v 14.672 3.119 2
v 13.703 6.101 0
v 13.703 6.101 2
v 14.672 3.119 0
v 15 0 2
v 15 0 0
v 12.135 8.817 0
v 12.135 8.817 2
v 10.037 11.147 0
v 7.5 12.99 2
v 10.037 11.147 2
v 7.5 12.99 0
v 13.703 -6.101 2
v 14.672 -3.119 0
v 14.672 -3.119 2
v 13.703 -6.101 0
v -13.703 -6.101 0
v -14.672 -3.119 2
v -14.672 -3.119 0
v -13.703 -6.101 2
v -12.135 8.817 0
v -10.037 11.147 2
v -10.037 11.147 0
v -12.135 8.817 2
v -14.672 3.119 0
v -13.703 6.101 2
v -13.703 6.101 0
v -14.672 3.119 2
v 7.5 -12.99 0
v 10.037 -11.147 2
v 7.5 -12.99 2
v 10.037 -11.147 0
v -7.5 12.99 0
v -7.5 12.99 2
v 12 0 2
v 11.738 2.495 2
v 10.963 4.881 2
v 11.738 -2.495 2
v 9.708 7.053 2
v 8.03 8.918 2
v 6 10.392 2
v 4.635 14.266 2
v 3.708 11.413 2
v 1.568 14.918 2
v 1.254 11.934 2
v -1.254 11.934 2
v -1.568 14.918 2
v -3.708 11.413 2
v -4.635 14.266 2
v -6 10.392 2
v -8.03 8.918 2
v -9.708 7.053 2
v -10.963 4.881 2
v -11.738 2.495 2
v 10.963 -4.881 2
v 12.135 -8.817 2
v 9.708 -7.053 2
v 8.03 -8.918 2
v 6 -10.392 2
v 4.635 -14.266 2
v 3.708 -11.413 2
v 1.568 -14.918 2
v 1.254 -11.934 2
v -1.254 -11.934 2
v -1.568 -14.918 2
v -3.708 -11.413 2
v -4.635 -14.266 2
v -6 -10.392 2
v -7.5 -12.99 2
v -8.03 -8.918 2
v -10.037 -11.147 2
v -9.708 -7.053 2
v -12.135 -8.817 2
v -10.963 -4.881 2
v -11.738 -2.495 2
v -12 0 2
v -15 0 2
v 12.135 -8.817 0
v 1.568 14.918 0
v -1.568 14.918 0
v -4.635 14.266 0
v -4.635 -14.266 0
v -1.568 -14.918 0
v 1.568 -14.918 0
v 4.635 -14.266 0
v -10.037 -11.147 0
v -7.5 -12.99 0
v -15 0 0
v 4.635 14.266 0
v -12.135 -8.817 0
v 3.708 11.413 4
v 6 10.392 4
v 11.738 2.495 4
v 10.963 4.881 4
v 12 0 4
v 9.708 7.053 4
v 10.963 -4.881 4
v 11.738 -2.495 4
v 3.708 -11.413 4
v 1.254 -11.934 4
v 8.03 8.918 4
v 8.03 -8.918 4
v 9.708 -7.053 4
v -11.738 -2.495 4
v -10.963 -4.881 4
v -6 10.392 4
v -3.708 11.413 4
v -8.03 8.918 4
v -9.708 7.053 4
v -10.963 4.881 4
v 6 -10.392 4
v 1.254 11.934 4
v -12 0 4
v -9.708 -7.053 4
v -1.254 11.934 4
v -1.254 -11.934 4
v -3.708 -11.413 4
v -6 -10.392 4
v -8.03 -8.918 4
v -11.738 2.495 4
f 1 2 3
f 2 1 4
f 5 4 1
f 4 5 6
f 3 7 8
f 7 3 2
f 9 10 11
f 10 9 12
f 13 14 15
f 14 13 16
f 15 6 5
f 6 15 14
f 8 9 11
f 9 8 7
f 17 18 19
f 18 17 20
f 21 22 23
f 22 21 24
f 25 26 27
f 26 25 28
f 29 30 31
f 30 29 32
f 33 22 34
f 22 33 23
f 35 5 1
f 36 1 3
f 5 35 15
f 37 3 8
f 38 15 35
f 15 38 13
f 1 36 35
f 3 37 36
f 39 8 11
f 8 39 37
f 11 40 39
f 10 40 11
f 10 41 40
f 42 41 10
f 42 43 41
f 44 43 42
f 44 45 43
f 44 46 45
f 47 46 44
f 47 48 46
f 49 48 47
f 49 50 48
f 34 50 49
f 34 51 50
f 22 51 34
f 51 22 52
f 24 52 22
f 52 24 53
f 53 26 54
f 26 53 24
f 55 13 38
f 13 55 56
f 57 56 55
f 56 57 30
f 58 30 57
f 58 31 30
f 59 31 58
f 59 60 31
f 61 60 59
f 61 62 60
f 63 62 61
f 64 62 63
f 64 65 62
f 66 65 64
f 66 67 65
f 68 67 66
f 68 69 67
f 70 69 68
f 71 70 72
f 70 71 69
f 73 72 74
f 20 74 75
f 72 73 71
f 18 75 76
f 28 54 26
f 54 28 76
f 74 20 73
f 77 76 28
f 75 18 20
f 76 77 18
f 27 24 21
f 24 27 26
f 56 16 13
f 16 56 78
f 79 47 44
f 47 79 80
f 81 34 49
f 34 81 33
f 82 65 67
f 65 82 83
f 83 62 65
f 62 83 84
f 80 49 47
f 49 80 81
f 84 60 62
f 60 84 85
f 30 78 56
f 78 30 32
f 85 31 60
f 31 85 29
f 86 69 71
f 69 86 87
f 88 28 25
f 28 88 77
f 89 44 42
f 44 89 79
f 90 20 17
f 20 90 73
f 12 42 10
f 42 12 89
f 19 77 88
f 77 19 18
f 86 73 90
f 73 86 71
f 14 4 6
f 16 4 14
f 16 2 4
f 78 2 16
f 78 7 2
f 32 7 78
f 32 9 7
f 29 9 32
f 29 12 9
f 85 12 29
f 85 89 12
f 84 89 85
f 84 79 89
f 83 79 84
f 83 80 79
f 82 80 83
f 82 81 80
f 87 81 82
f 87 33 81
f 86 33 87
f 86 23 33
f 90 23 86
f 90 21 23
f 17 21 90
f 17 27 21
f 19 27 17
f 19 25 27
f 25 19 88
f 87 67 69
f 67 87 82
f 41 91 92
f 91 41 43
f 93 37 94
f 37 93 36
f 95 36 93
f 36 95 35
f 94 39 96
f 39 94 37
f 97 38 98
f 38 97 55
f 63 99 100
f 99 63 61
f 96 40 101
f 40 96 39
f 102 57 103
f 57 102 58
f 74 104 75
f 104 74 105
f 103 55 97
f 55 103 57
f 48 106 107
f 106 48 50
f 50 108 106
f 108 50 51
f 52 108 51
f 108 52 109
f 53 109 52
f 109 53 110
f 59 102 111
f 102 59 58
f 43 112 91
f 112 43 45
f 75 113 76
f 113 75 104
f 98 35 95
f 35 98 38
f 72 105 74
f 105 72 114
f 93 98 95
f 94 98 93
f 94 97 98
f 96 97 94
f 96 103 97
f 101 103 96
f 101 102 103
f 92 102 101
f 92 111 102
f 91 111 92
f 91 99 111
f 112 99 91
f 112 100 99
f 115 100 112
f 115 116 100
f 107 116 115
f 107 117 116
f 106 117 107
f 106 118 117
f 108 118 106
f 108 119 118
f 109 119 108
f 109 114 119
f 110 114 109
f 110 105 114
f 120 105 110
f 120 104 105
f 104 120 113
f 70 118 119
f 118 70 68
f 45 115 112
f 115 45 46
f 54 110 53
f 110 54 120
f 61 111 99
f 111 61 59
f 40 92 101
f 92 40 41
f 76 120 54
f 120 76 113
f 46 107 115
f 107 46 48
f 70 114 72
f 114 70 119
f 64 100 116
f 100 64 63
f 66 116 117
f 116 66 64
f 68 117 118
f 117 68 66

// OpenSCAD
// dubsWheel.scad - Basic example of CSG usage



union() {
    cylinder(2,15,15, center=0);
    cylinder(4,12,12, center=0);
}



echo(version=version());
// Written by Brian Edgar
